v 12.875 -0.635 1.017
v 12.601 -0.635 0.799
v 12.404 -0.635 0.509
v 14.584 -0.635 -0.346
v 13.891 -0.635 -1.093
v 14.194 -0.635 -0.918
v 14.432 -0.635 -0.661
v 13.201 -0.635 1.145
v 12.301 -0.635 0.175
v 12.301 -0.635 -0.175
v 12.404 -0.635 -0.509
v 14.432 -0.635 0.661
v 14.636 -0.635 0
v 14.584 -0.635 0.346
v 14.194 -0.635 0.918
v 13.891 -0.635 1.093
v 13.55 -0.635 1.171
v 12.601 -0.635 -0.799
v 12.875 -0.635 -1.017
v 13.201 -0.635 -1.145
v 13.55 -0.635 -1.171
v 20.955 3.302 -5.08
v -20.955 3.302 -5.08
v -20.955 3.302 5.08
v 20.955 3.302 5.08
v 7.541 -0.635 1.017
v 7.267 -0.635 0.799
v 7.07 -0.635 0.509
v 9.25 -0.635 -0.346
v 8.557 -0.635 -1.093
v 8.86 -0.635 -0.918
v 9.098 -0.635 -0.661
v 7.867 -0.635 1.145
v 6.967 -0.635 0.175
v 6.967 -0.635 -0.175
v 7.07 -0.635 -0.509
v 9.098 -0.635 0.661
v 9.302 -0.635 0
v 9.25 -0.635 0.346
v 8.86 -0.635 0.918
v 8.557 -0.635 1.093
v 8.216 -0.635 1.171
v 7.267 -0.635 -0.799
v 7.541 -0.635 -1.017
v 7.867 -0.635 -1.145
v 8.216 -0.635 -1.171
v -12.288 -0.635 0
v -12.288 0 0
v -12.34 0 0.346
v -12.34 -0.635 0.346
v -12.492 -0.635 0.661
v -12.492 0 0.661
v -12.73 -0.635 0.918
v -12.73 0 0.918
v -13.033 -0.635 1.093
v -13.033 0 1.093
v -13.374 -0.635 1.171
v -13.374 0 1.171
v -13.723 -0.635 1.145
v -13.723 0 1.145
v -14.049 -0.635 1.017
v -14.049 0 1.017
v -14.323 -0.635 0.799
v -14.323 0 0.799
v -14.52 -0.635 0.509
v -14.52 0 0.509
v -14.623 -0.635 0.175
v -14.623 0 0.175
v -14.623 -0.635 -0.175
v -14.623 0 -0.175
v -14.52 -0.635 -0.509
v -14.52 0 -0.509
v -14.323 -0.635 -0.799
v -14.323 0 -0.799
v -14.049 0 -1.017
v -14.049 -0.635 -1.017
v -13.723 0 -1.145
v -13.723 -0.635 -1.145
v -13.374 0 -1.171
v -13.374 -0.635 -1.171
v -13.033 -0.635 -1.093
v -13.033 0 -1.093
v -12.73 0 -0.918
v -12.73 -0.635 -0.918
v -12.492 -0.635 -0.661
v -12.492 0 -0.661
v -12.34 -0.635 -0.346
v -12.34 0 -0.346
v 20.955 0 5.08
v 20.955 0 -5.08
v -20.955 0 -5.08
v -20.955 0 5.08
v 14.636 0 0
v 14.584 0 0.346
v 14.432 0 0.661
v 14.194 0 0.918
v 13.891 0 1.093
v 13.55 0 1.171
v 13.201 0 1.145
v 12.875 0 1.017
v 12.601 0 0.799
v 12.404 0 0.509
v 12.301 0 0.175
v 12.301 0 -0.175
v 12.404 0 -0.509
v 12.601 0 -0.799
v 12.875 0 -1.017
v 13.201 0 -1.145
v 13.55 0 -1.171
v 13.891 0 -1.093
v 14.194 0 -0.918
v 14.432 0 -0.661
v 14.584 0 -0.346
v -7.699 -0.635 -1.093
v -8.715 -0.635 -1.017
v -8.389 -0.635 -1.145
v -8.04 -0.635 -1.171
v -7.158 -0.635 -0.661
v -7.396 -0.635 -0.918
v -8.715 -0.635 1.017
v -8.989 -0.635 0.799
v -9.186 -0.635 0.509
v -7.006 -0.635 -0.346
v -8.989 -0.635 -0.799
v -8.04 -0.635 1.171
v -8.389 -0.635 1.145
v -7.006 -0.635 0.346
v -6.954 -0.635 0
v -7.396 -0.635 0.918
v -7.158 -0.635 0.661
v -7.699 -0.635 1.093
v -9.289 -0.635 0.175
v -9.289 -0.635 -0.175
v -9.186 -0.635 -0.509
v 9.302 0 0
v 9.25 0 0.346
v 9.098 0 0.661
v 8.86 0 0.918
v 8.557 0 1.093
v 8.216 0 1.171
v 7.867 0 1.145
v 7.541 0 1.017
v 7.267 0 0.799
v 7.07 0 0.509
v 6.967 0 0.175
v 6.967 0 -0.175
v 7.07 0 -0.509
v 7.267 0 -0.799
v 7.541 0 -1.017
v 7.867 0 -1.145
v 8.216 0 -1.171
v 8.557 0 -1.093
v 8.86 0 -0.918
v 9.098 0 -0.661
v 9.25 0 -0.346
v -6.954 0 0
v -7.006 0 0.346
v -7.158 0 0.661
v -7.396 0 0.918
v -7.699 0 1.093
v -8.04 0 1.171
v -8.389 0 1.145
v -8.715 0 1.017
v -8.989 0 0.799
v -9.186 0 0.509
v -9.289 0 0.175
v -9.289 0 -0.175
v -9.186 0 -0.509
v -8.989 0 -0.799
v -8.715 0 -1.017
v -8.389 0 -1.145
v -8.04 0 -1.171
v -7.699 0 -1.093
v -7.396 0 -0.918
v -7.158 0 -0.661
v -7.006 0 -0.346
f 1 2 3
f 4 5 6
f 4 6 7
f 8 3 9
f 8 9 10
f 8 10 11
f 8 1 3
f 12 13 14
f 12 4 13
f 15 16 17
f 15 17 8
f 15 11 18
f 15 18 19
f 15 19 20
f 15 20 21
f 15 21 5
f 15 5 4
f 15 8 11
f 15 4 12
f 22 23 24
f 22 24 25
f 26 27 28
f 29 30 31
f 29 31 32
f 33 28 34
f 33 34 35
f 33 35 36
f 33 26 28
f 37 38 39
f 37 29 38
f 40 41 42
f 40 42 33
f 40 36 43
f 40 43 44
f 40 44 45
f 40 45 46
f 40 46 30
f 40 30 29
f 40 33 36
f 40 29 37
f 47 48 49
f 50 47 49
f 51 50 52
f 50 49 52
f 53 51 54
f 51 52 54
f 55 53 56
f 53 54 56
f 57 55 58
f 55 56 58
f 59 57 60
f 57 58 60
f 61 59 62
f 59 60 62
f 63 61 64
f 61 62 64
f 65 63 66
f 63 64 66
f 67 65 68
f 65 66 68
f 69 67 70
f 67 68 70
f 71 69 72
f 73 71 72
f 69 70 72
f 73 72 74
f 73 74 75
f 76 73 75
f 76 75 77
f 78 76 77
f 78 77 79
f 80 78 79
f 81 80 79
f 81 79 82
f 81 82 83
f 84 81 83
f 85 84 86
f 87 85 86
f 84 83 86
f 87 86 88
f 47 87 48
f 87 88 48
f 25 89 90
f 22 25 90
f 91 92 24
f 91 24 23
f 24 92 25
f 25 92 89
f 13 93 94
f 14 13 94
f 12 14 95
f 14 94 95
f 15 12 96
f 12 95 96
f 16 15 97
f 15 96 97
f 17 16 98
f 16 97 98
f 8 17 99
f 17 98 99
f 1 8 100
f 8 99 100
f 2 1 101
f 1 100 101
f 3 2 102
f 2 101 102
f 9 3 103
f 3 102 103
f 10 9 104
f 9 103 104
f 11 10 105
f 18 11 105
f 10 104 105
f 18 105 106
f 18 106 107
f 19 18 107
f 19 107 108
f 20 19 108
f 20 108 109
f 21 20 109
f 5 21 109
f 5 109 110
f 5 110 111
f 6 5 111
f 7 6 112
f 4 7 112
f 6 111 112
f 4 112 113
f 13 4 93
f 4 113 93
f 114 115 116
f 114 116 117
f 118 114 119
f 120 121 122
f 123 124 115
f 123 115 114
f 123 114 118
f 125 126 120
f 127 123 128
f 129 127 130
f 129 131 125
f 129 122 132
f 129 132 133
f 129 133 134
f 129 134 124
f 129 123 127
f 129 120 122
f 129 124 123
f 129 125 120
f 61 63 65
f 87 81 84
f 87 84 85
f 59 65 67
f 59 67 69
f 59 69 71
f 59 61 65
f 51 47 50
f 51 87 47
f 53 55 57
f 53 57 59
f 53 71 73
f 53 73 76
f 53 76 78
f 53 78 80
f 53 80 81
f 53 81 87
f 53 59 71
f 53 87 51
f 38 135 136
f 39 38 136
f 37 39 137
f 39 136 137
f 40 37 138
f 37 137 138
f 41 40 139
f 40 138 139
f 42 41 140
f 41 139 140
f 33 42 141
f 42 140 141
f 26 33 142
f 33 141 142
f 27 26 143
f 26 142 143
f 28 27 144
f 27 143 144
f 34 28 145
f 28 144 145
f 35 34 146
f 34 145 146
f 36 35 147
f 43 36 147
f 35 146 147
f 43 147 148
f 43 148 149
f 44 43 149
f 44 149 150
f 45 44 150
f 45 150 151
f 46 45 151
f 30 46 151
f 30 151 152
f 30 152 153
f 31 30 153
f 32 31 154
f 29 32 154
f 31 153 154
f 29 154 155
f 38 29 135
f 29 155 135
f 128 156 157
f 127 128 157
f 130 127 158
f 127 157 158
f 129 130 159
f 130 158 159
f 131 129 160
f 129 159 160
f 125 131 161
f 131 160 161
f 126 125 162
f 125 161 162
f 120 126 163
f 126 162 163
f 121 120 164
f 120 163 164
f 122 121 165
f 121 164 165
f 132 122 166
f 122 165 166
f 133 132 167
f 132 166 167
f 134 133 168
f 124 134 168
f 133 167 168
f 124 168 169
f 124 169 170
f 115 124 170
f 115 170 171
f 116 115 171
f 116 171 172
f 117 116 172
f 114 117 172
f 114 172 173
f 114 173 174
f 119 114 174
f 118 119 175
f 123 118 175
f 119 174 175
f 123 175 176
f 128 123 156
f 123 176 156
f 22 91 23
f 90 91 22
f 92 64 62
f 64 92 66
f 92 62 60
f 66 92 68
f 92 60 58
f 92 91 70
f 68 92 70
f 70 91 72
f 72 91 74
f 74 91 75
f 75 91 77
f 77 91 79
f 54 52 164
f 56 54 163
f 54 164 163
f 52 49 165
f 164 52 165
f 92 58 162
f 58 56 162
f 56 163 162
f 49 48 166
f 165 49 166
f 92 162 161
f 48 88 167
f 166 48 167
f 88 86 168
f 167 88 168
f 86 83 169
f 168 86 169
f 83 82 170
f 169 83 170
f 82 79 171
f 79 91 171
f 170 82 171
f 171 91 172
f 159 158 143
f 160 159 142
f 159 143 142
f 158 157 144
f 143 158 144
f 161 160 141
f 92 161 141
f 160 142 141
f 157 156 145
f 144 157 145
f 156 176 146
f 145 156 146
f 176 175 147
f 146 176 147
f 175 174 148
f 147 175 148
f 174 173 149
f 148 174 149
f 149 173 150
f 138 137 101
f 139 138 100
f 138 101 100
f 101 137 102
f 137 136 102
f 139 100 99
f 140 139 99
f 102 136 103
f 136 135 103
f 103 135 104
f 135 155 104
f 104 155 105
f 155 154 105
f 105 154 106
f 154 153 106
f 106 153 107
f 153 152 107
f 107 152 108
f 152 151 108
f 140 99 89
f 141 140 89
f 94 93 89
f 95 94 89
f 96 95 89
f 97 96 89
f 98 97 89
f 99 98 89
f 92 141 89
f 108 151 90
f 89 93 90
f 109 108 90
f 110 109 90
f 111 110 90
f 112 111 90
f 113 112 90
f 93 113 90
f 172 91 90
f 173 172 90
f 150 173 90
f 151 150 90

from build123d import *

# Parameters (mm, degrees)
SKETCH1_W           = 41.91
SKETCH1_H           = 10.16
BOSS_EXTRUDE1_DEPTH = 3.302
SKETCH2_R           = 1.174037675
BOSS_EXTRUDE2_DEPTH = 0.635


with BuildPart() as part:
    # Sketch1 → Boss-Extrude1 (new body)
    with BuildSketch(Plane(origin=(0, 0, 0), x_dir=(1, 0, 0), z_dir=(0, 1, 0))):
        Rectangle(SKETCH1_W, SKETCH1_H)
    extrude(amount=BOSS_EXTRUDE1_DEPTH)

    # Sketch2 → Boss-Extrude2 (add)
    with BuildSketch(Plane.XZ):
        with Locations((-13.462, 0)):
            Circle(SKETCH2_R)
        with Locations((-8.128, 0)):
            Circle(SKETCH2_R)
        with Locations((8.128, 0)):
            Circle(SKETCH2_R)
        with Locations((13.462, 0)):
            Circle(SKETCH2_R)
    extrude(amount=BOSS_EXTRUDE2_DEPTH)


solid = part.part
